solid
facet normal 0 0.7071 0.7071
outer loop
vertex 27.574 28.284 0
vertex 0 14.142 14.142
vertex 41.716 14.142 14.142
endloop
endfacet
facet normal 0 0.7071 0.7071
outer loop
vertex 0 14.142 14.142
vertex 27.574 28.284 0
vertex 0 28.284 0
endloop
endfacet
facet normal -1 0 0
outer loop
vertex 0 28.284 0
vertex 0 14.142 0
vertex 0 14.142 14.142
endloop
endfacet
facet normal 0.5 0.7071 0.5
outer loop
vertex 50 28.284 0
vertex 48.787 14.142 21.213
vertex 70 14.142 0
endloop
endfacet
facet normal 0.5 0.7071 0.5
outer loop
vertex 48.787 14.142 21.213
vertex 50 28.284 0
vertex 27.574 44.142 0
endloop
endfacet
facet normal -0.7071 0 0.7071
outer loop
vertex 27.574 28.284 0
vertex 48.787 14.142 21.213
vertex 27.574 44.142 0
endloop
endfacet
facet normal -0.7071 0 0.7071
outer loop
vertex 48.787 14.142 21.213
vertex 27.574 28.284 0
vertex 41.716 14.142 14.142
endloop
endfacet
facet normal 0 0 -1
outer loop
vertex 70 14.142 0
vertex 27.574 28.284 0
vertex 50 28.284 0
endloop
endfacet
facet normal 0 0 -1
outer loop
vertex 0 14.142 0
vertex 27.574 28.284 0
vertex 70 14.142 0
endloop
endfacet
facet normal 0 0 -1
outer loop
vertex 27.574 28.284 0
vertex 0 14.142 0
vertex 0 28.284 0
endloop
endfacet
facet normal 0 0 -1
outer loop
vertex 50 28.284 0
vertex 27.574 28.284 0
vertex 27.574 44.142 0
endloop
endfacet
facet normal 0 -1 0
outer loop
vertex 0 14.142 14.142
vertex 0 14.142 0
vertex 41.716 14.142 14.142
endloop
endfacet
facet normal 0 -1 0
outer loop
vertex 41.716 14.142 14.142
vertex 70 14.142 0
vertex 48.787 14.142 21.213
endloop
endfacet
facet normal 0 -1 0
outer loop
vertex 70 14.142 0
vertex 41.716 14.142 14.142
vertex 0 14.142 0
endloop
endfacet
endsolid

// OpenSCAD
intersection() {
	union() {
		rotate([-45, 0, 0]) {
			cube([50, 20, 20]);
		}
		translate([70, 20 / sqrt(2),0]) {
			mirror([1, 0, 0]) {
				rotate([90, 45, 0]) {
					rotate([0, 45, 0]) {
						cube([60, 30, 60]);
					}
				}
			}
		}
	}
	translate([0,20 / sqrt(2), 0]) { //Half arrow.
		cube([100, 100, 100]);
	}
}
